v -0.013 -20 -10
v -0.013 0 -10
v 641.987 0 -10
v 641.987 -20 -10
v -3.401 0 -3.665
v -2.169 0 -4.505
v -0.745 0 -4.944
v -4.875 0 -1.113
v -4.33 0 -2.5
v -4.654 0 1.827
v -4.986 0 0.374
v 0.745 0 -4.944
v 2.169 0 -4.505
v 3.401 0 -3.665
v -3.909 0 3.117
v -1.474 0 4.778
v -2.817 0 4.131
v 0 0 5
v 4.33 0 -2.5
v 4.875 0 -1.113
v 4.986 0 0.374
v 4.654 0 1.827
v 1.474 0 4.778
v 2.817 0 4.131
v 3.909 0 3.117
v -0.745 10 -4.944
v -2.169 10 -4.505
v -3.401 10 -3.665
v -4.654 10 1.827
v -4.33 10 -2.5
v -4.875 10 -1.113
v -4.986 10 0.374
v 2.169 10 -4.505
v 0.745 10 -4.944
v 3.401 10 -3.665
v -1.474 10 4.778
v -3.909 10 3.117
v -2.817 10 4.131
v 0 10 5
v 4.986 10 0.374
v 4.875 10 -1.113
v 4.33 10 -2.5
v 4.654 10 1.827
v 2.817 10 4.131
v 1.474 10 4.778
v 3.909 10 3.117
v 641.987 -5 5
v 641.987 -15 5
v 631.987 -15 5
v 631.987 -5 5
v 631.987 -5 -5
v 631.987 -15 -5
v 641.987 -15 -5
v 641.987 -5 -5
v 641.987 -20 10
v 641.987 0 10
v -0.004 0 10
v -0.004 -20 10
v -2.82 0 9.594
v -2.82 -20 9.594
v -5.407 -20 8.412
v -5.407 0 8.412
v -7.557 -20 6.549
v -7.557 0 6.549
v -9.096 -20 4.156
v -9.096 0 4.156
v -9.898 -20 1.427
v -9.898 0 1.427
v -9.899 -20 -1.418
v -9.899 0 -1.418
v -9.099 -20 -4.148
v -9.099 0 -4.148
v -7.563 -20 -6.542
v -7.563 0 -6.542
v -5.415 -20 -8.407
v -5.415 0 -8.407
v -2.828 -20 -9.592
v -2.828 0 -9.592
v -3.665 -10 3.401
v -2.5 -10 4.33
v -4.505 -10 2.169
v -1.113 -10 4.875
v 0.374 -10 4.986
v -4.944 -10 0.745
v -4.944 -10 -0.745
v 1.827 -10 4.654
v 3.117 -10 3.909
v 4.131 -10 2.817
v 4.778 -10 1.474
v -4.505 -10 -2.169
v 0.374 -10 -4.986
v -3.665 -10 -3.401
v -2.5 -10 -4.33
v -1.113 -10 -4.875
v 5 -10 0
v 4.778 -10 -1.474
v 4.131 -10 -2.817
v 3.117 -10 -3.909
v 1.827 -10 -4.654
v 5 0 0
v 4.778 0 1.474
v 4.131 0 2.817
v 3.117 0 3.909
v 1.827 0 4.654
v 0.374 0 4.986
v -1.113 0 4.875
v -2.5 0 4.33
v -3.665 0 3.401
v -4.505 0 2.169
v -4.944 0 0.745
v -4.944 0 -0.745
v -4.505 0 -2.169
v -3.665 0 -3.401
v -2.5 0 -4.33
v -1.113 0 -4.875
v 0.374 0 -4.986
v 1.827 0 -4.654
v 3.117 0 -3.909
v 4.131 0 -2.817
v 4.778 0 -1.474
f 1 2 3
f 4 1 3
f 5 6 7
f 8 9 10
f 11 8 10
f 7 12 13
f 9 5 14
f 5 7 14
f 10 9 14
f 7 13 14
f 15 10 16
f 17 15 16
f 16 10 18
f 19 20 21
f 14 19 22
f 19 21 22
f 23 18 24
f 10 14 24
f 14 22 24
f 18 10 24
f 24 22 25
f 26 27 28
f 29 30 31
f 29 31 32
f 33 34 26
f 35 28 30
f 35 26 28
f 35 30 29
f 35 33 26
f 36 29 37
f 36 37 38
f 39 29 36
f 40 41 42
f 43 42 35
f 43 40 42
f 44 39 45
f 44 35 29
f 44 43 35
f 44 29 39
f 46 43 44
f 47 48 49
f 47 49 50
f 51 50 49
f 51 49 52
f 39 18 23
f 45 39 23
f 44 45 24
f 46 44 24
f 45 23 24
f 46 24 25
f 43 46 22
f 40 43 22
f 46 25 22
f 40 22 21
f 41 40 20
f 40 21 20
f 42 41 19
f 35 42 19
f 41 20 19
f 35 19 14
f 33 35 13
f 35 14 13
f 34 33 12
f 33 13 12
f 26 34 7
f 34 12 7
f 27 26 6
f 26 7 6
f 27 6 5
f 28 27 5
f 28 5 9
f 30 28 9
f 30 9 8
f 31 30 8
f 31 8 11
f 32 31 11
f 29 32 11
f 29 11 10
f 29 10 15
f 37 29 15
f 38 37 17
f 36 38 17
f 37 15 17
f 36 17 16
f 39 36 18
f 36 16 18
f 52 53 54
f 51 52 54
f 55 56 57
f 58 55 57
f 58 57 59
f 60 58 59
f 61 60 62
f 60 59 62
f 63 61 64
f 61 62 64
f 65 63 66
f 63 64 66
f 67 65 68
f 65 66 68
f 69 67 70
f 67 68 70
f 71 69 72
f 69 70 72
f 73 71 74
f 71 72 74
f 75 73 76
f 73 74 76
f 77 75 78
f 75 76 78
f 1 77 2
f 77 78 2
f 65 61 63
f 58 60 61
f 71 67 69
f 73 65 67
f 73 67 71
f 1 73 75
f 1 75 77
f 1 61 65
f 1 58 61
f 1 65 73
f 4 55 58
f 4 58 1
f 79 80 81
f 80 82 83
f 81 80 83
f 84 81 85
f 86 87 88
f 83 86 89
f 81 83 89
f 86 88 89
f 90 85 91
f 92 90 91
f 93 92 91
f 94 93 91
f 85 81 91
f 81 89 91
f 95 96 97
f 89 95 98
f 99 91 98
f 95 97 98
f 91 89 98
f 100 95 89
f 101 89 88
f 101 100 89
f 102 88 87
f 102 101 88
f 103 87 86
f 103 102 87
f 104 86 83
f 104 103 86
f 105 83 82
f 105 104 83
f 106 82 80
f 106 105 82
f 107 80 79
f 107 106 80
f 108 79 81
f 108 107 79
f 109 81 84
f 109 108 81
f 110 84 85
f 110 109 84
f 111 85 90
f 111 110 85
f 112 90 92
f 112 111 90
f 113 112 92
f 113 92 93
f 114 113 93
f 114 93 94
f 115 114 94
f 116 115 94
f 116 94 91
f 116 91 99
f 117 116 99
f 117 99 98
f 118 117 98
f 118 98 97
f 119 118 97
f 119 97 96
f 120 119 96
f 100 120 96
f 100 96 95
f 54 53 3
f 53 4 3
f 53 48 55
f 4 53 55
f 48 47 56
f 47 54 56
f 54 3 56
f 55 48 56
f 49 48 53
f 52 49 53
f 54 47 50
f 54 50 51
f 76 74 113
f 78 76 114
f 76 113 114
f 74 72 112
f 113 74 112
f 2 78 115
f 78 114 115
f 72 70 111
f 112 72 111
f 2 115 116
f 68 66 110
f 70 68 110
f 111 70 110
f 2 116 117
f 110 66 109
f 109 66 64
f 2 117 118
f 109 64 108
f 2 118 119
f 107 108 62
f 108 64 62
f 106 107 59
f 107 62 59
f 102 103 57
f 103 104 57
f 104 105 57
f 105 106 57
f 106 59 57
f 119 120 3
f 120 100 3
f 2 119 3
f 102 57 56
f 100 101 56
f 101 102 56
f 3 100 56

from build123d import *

# Parameters (mm, degrees)
SKETCH1_R               = 5
BOSS_EXTRUDE1_DEPTH     = 10
BOSS_EXTRUDE2_OUTLINE_R = 5
BOSS_EXTRUDE2_DEPTH     = 20
SKETCH4_W               = 10
SKETCH4_H               = 10
CUT_EXTRUDE1_DEPTH      = 10
SKETCH5_R               = 5
BOSS_EXTRUDE3_DEPTH     = 10


# Read off the part's stored shape, not the designer's step: Boss-Extrude2
with BuildPart() as part:
    # Sketch1 → Boss-Extrude1 (new body)
    with BuildSketch(Plane(origin=(0, 0, 0), x_dir=(1, 0, 0), z_dir=(0, 1, 0))):
        with Locations(Location((0, 0, 0), (0, 0, 270))):
            Circle(SKETCH1_R)
    extrude(amount=BOSS_EXTRUDE1_DEPTH)


with BuildPart() as body_2:
    # Boss-Extrude2 outline → Boss-Extrude2 (new body)
    with BuildSketch(Plane.XZ):
        with BuildLine():
            ThreePointArc((-0.004263044, 10), (-10.000000014, 0.004229813), (-0.012722666, -9.999992815))
            Line((-0.012722666, -9.999992815), (641.987277325, -10))
            Line((641.987277325, -10), (641.987277325, 10))
            Line((641.987277325, 10), (-0.004263044, 10))
        make_face()
        Circle(BOSS_EXTRUDE2_OUTLINE_R, mode=Mode.SUBTRACT)
    extrude(amount=BOSS_EXTRUDE2_DEPTH)

    # Sketch4 → Cut-Extrude1 (cut)
    with BuildSketch(Plane(origin=(641.987277325, 0, 0), x_dir=(0, 0, -1), z_dir=(1, 0, 0))):
        with Locations((0, -10)):
            Rectangle(SKETCH4_W, SKETCH4_H)
    extrude(amount=-CUT_EXTRUDE1_DEPTH, mode=Mode.SUBTRACT)

    # Sketch5 → Boss-Extrude3 (add)
    with BuildSketch(Plane.XZ.offset(20)):
        with Locations(Location((0, 0, 0), (0, 0, 270))):
            Circle(SKETCH5_R)
    extrude(amount=-BOSS_EXTRUDE3_DEPTH)


solid = Compound([part.part, body_2.part])
